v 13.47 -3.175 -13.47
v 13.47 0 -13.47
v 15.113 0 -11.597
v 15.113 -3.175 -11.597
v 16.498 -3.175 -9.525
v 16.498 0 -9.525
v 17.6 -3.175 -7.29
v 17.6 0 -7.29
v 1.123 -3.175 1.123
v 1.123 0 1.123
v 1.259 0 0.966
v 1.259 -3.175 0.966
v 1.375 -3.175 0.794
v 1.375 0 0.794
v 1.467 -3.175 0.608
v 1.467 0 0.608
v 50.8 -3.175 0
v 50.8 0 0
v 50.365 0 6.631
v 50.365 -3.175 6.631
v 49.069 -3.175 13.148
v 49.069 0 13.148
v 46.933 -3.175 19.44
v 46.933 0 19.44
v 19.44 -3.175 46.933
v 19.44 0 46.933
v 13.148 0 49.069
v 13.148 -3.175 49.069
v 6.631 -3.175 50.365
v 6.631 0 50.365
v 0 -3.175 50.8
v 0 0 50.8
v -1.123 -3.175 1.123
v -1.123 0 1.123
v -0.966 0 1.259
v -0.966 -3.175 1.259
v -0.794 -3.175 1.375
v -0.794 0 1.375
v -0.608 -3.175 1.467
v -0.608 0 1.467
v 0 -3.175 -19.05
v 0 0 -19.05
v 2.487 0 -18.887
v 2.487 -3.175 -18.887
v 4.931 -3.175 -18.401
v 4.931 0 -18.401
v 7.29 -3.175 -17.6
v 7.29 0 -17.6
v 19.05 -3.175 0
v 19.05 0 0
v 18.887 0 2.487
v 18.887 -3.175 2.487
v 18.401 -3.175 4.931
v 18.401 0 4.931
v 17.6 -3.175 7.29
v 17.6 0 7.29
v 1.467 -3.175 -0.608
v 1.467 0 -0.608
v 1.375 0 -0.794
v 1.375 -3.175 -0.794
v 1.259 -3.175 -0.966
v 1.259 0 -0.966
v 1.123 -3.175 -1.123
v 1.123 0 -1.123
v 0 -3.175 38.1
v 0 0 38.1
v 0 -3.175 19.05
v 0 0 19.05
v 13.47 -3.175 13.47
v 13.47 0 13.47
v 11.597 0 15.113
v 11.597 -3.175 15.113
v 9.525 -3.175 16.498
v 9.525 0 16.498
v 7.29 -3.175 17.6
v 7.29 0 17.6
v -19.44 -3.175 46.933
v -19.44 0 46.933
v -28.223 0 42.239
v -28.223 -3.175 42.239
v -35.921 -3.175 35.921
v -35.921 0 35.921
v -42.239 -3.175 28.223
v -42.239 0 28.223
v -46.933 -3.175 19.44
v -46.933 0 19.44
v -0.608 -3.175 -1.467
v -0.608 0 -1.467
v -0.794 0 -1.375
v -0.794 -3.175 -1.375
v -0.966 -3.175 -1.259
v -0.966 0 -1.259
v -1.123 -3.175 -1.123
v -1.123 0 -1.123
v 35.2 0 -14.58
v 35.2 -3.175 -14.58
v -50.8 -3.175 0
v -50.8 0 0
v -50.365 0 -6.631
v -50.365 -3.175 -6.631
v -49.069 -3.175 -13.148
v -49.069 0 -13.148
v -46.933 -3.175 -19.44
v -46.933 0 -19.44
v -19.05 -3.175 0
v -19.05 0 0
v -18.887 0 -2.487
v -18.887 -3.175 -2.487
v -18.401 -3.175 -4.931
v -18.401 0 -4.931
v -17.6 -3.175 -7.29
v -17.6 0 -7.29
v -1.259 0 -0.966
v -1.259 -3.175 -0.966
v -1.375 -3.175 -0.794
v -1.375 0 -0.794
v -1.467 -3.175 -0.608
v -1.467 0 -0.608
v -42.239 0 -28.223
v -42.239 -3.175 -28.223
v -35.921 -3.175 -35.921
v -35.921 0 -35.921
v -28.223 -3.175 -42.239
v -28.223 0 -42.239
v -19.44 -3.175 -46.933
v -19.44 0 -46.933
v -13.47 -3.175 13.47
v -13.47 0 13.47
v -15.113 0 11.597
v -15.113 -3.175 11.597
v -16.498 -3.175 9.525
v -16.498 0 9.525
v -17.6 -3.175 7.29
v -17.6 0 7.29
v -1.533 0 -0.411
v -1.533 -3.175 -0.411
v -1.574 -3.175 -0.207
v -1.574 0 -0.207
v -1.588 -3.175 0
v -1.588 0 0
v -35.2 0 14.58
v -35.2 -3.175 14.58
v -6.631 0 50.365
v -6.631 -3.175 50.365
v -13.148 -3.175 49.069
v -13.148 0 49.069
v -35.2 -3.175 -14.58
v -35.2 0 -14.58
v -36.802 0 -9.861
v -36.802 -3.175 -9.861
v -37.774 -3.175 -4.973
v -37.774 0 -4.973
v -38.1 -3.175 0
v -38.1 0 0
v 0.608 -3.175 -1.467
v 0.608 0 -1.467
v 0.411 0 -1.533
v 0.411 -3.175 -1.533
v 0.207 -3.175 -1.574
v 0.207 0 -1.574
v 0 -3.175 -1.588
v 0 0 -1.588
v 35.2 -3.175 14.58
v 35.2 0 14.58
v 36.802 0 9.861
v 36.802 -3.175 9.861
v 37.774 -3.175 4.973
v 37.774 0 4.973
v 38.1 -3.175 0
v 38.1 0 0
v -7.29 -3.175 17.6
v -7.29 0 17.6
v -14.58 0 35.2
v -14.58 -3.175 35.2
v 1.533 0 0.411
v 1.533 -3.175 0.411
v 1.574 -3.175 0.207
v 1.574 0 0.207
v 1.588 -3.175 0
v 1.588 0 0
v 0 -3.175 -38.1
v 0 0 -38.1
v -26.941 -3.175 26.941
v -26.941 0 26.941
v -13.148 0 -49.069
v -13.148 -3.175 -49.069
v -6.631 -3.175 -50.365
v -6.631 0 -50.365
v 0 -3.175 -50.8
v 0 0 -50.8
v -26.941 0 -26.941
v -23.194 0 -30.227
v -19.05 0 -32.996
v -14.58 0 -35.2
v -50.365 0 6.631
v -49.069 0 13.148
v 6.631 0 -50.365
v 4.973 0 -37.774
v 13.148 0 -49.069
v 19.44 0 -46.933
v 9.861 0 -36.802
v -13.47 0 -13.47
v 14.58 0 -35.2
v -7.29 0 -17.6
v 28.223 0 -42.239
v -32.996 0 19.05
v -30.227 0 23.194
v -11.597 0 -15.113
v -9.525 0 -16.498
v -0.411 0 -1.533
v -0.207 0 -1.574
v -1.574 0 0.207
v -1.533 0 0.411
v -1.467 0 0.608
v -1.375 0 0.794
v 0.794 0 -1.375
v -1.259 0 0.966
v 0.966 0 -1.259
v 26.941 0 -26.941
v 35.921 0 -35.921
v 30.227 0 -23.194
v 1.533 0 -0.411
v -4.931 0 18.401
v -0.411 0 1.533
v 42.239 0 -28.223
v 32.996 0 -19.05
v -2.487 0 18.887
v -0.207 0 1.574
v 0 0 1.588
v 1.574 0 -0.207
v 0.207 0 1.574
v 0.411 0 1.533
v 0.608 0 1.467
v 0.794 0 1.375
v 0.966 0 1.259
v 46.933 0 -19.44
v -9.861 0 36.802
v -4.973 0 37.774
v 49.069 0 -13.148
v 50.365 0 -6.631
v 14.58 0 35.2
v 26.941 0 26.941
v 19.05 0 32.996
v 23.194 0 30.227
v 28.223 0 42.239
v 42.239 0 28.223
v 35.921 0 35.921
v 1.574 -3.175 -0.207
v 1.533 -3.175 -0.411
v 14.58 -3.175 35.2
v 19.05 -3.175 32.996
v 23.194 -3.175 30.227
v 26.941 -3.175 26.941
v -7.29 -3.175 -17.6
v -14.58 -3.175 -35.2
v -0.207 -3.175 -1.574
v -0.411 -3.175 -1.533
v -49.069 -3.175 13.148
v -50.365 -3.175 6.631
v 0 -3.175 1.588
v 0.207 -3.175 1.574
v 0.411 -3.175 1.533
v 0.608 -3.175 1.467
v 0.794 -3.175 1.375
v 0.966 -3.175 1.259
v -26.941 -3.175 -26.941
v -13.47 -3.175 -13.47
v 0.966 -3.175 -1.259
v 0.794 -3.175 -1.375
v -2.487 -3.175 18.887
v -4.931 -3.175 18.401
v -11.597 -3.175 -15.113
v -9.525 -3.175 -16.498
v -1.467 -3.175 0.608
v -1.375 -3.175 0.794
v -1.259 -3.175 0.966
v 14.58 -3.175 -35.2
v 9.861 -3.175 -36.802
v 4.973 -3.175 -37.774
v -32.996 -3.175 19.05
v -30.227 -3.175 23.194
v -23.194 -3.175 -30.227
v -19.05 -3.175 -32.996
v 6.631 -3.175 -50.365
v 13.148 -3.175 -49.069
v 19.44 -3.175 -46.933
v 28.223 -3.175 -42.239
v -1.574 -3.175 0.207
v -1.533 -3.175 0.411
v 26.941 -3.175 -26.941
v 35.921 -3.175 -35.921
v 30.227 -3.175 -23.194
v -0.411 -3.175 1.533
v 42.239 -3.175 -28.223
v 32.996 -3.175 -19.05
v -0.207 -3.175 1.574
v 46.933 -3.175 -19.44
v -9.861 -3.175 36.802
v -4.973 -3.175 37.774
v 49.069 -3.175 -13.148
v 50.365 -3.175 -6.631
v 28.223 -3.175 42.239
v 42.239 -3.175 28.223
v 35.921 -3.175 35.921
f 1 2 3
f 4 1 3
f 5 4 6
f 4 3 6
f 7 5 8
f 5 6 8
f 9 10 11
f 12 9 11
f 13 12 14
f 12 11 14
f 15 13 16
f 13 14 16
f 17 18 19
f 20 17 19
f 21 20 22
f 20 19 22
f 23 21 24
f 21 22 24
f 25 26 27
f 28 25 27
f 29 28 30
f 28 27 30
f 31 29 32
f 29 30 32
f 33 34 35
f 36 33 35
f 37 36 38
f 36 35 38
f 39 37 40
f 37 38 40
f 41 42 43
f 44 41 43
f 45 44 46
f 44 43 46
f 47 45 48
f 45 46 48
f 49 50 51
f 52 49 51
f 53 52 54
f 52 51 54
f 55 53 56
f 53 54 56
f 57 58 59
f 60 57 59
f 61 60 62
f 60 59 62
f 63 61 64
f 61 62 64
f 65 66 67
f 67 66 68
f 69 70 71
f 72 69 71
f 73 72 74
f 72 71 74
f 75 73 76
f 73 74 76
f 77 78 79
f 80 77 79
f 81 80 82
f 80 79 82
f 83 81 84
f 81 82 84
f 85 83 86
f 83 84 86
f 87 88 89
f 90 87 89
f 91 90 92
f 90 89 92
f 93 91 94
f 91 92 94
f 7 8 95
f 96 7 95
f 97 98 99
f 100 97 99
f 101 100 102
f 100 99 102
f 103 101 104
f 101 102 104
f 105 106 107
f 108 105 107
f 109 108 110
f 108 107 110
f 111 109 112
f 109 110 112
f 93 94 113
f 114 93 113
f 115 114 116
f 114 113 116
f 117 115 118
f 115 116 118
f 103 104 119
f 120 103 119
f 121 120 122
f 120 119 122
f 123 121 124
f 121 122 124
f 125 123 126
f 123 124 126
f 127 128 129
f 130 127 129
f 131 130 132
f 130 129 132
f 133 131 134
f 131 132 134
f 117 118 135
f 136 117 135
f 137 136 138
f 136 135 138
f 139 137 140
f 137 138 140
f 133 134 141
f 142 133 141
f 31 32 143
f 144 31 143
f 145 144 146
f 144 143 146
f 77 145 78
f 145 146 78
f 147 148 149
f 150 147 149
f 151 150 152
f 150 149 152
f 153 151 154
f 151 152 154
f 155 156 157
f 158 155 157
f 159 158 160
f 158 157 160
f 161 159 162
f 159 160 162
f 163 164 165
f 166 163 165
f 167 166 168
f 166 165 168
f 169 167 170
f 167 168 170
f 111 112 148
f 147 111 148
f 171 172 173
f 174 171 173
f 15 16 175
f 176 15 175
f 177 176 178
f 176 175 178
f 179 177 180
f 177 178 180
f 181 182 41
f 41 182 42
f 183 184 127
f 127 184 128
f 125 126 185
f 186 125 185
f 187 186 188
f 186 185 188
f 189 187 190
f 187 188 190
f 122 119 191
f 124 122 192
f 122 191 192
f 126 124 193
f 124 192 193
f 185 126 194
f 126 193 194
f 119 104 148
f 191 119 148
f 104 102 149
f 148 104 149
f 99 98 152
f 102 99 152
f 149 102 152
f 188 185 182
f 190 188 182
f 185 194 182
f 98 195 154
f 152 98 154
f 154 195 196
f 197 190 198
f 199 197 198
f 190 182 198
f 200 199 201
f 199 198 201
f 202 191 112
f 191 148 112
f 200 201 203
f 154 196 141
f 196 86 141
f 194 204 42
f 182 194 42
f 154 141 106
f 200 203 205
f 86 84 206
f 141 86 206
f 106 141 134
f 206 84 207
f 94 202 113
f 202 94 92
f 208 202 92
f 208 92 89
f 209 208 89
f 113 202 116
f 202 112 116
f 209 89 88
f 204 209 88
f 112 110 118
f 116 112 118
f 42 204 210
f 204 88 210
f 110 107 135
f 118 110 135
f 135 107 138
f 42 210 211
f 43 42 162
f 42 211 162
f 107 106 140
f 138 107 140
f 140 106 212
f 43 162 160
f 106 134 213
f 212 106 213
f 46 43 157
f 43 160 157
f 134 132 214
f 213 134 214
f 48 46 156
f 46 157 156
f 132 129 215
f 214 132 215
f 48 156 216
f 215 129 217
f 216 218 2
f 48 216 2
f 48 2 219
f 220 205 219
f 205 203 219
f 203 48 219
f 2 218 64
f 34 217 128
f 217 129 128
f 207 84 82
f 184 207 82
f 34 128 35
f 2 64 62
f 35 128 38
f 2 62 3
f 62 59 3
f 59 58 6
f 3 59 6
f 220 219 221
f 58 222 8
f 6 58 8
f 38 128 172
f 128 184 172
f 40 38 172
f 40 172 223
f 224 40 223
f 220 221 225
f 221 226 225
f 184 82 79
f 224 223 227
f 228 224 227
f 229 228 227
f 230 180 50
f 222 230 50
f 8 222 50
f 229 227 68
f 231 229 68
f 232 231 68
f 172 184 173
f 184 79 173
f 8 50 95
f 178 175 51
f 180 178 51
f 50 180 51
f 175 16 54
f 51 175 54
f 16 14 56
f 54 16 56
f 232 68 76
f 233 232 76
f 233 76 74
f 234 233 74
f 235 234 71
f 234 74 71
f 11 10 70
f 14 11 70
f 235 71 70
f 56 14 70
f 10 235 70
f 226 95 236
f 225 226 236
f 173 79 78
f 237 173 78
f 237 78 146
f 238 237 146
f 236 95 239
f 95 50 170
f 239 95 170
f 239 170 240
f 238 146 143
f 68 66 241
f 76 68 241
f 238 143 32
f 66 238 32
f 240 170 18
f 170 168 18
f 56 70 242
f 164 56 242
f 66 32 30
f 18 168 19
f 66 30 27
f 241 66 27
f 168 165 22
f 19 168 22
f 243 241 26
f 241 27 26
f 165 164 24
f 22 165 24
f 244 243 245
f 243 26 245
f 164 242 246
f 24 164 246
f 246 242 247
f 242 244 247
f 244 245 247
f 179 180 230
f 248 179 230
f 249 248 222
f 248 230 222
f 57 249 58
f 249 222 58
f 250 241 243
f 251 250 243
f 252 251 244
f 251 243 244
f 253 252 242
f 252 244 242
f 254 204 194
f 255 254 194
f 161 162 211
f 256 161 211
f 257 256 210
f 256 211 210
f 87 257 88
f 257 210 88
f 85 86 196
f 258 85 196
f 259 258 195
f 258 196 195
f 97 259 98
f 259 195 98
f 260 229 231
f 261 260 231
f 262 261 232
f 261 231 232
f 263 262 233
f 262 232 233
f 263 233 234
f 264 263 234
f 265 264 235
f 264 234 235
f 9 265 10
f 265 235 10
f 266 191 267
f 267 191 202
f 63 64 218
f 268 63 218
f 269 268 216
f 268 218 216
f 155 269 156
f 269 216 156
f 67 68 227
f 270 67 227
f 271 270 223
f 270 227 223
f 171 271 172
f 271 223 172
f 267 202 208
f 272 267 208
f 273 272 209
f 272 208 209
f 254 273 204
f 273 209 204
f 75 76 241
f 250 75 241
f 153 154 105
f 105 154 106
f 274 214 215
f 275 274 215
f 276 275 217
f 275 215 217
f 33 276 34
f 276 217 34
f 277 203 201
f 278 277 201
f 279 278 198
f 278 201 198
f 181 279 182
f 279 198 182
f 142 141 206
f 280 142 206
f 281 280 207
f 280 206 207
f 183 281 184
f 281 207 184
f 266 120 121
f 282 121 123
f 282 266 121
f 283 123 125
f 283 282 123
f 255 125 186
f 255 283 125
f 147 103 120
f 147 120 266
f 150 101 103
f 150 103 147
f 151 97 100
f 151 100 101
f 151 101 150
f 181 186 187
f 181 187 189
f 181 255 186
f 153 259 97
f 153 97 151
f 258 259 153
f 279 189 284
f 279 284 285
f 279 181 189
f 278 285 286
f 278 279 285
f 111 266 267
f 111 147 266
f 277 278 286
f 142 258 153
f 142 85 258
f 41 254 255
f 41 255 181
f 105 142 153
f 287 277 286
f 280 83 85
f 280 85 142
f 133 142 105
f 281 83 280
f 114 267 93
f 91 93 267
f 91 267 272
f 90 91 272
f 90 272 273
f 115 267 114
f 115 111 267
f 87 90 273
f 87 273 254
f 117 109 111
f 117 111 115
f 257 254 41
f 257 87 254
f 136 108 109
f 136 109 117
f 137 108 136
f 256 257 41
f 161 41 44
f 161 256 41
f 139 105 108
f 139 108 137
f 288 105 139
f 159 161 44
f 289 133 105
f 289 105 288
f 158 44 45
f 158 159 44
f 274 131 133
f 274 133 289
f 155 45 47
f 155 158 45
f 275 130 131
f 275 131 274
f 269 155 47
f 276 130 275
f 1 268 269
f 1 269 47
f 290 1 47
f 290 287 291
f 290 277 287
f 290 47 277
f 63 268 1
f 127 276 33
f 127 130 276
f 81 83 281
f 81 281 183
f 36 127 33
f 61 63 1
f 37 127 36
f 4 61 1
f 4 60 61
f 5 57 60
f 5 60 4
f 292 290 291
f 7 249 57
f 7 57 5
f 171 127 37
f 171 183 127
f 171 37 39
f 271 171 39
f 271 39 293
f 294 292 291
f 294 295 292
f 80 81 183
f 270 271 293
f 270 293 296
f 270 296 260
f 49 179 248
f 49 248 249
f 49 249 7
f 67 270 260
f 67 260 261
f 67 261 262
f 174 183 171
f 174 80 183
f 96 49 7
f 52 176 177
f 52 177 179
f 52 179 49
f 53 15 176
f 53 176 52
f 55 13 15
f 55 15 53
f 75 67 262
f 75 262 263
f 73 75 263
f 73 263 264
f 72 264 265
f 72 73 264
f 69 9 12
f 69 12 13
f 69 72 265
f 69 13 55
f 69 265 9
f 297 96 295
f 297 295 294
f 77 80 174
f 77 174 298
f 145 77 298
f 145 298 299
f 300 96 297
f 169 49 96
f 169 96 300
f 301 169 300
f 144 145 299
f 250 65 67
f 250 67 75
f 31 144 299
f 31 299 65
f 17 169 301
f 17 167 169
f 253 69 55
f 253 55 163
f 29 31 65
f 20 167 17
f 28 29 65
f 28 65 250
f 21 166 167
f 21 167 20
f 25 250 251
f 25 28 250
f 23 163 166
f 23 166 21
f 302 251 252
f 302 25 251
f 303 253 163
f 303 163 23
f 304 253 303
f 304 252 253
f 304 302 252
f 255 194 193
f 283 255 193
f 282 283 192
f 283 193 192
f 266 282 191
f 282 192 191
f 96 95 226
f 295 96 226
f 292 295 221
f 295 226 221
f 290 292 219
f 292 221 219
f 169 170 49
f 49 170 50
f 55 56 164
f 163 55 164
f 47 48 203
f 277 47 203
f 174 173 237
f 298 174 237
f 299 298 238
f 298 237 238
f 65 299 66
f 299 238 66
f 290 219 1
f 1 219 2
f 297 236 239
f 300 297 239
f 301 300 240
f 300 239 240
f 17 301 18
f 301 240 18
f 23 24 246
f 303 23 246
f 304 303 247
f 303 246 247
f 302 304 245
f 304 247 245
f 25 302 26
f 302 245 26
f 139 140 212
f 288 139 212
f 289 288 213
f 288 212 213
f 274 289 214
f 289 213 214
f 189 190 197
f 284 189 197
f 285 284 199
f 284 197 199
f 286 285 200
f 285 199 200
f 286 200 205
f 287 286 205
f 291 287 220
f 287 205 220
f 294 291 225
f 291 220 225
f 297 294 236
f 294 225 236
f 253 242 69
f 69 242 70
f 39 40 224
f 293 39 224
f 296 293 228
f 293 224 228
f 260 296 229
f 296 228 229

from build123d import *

# Parameters (mm, degrees)
F1_DEPTH = 3.175


with BuildPart() as f1:
    # F0 (on Front) → F1 (new body)
    with BuildSketch(Plane.XZ):
        with BuildLine():
            Line((26.9407683632, 26.9407683632), (35.9210244843, 35.9210244843))
            ThreePointArc((35.9210244843, 35.9210244843), (28.2229678374, 42.238656305), (19.4403183641, 46.9330802516))
            Line((19.4403183641, 46.9330802516), (14.5802387731, 35.1998101887))
            ThreePointArc((14.5802387731, 35.1998101887), (21.167225878, 31.6789922287), (26.9407683632, 26.9407683632))
        make_face()
        with BuildLine():
            Line((0, 38.1), (0, 50.8))
            ThreePointArc((0, 50.8), (-9.9105883584, 49.8238922445), (-19.4403183641, 46.9330802516))
            Line((-19.4403183641, 46.9330802516), (-14.5802387731, 35.1998101887))
            ThreePointArc((-14.5802387731, 35.1998101887), (-7.4329412688, 37.3679191834), (0, 38.1))
        make_face()
        with BuildLine():
            Line((-26.9407683632, 26.9407683632), (-35.9210244843, 35.9210244843))
            ThreePointArc((-35.9210244843, 35.9210244843), (-42.238656305, 28.2229678374), (-46.9330802516, 19.4403183641))
            Line((-46.9330802516, 19.4403183641), (-35.1998101887, 14.5802387731))
            ThreePointArc((-35.1998101887, 14.5802387731), (-31.6789922287, 21.167225878), (-26.9407683632, 26.9407683632))
        make_face()
        with BuildLine():
            Line((38.1, 0), (50.8, 0))
            ThreePointArc((50.8, 0), (49.8238922445, 9.9105883584), (46.9330802516, 19.4403183641))
            Line((46.9330802516, 19.4403183641), (35.1998101887, 14.5802387731))
            ThreePointArc((35.1998101887, 14.5802387731), (37.3679191834, 7.4329412688), (38.1, 0))
        make_face()
        with BuildLine():
            ThreePointArc((-35.9210244843, -35.9210244843), (-28.2229678374, -42.238656305), (-19.4403183641, -46.9330802516))
            Line((-19.4403183641, -46.9330802516), (-14.5802387731, -35.1998101887))
            ThreePointArc((-14.5802387731, -35.1998101887), (-21.167225878, -31.6789922287), (-26.9407683632, -26.9407683632))
            Line((-26.9407683632, -26.9407683632), (-35.9210244843, -35.9210244843))
        make_face()
        with BuildLine():
            ThreePointArc((0, -50.8), (9.9105883584, -49.8238922445), (19.4403183641, -46.9330802516))
            Line((19.4403183641, -46.9330802516), (14.5802387731, -35.1998101887))
            ThreePointArc((14.5802387731, -35.1998101887), (7.4329412688, -37.3679191834), (0, -38.1))
            Line((0, -38.1), (0, -50.8))
        make_face()
        with BuildLine():
            ThreePointArc((35.9210244843, -35.9210244843), (42.238656305, -28.2229678374), (46.9330802516, -19.4403183641))
            Line((46.9330802516, -19.4403183641), (35.1998101887, -14.5802387731))
            ThreePointArc((35.1998101887, -14.5802387731), (31.6789922287, -21.167225878), (26.9407683632, -26.9407683632))
            Line((26.9407683632, -26.9407683632), (35.9210244843, -35.9210244843))
        make_face()
        with BuildLine():
            Line((-13.4703841816, 13.4703841816), (-1.1225320151, 1.1225320151))
            ThreePointArc((-1.1225320151, 1.1225320151), (-0.8819677449, 1.3199580095), (-0.6075099489, 1.4666587579))
            Line((-0.6075099489, 1.4666587579), (-7.2901193866, 17.5999050943))
            ThreePointArc((-7.2901193866, 17.5999050943), (-10.583612939, 15.8394961144), (-13.4703841816, 13.4703841816))
        make_face()
        with BuildLine():
            Line((0.6075099489, 1.4666587579), (7.2901193866, 17.5999050943))
            ThreePointArc((7.2901193866, 17.5999050943), (3.7164706344, 18.6839595917), (0, 19.05))
            Line((0, 19.05), (0, 1.5875))
            ThreePointArc((0, 1.5875), (0.3097058862, 1.5569966326), (0.6075099489, 1.4666587579))
        make_face()
        with BuildLine():
            Line((1.1225320151, 1.1225320151), (13.4703841816, 13.4703841816))
            ThreePointArc((13.4703841816, 13.4703841816), (10.583612939, 15.8394961144), (7.2901193866, 17.5999050943))
            Line((7.2901193866, 17.5999050943), (0.6075099489, 1.4666587579))
            ThreePointArc((0.6075099489, 1.4666587579), (0.8819677449, 1.3199580095), (1.1225320151, 1.1225320151))
        make_face()
        with BuildLine():
            Line((1.4666587579, 0.6075099489), (17.5999050943, 7.2901193866))
            ThreePointArc((17.5999050943, 7.2901193866), (15.8394961144, 10.583612939), (13.4703841816, 13.4703841816))
            Line((13.4703841816, 13.4703841816), (1.1225320151, 1.1225320151))
            ThreePointArc((1.1225320151, 1.1225320151), (1.3199580095, 0.8819677449), (1.4666587579, 0.6075099489))
        make_face()
        with BuildLine():
            Line((1.5875, 0), (19.05, 0))
            ThreePointArc((19.05, 0), (18.6839595917, 3.7164706344), (17.5999050943, 7.2901193866))
            Line((17.5999050943, 7.2901193866), (1.4666587579, 0.6075099489))
            ThreePointArc((1.4666587579, 0.6075099489), (1.5569966326, 0.3097058862), (1.5875, 0))
        make_face()
        with BuildLine():
            ThreePointArc((17.5999050943, -7.2901193866), (18.6839595917, -3.7164706344), (19.05, 0))
            Line((19.05, 0), (1.5875, 0))
            ThreePointArc((1.5875, 0), (1.5569966326, -0.3097058862), (1.4666587579, -0.6075099489))
            Line((1.4666587579, -0.6075099489), (17.5999050943, -7.2901193866))
        make_face()
        with BuildLine():
            ThreePointArc((7.2901193866, -17.5999050943), (10.583612939, -15.8394961144), (13.4703841816, -13.4703841816))
            Line((13.4703841816, -13.4703841816), (1.1225320151, -1.1225320151))
            ThreePointArc((1.1225320151, -1.1225320151), (0.8819677449, -1.3199580095), (0.6075099489, -1.4666587579))
            Line((0.6075099489, -1.4666587579), (7.2901193866, -17.5999050943))
        make_face()
        with BuildLine():
            Line((-13.4703841816, -13.4703841816), (-1.1225320151, -1.1225320151))
            ThreePointArc((-1.1225320151, -1.1225320151), (-1.3199580095, -0.8819677449), (-1.4666587579, -0.6075099489))
            Line((-1.4666587579, -0.6075099489), (-17.5999050943, -7.2901193866))
            ThreePointArc((-17.5999050943, -7.2901193866), (-15.8394961144, -10.583612939), (-13.4703841816, -13.4703841816))
        make_face()
        with BuildLine():
            Line((-19.05, 0), (-1.5875, 0))
            ThreePointArc((-1.5875, 0), (-1.5569966326, 0.3097058862), (-1.4666587579, 0.6075099489))
            Line((-1.4666587579, 0.6075099489), (-17.5999050943, 7.2901193866))
            ThreePointArc((-17.5999050943, 7.2901193866), (-18.6839595917, 3.7164706344), (-19.05, 0))
        make_face()
        with BuildLine():
            ThreePointArc((-1.4666587579, 0.6075099489), (-1.3199580095, 0.8819677449), (-1.1225320151, 1.1225320151))
            Line((-1.1225320151, 1.1225320151), (-13.4703841816, 13.4703841816))
            ThreePointArc((-13.4703841816, 13.4703841816), (-15.8394961144, 10.583612939), (-17.5999050943, 7.2901193866))
            Line((-17.5999050943, 7.2901193866), (-1.4666587579, 0.6075099489))
        make_face()
        with BuildLine():
            ThreePointArc((-1.4666587579, -0.6075099489), (-1.5569966326, -0.3097058862), (-1.5875, 0))
            Line((-1.5875, 0), (-19.05, 0))
            ThreePointArc((-19.05, 0), (-18.6839595917, -3.7164706344), (-17.5999050943, -7.2901193866))
            Line((-17.5999050943, -7.2901193866), (-1.4666587579, -0.6075099489))
        make_face()
        with BuildLine():
            ThreePointArc((-0.6075099489, -1.4666587579), (-0.8819677449, -1.3199580095), (-1.1225320151, -1.1225320151))
            Line((-1.1225320151, -1.1225320151), (-13.4703841816, -13.4703841816))
            ThreePointArc((-13.4703841816, -13.4703841816), (-10.583612939, -15.8394961144), (-7.2901193866, -17.5999050943))
            Line((-7.2901193866, -17.5999050943), (-0.6075099489, -1.4666587579))
        make_face()
        with BuildLine():
            Line((0, -19.05), (0, -1.5875))
            ThreePointArc((0, -1.5875), (-0.3097058862, -1.5569966326), (-0.6075099489, -1.4666587579))
            Line((-0.6075099489, -1.4666587579), (-7.2901193866, -17.5999050943))
            ThreePointArc((-7.2901193866, -17.5999050943), (-3.7164706344, -18.6839595917), (0, -19.05))
        make_face()
        with BuildLine():
            ThreePointArc((0, -19.05), (3.7164706344, -18.6839595917), (7.2901193866, -17.5999050943))
            Line((7.2901193866, -17.5999050943), (0.6075099489, -1.4666587579))
            ThreePointArc((0.6075099489, -1.4666587579), (0.3097058862, -1.5569966326), (0, -1.5875))
            Line((0, -1.5875), (0, -19.05))
        make_face()
        with BuildLine():
            ThreePointArc((13.4703841816, -13.4703841816), (15.8394961144, -10.583612939), (17.5999050943, -7.2901193866))
            Line((17.5999050943, -7.2901193866), (1.4666587579, -0.6075099489))
            ThreePointArc((1.4666587579, -0.6075099489), (1.3199580095, -0.8819677449), (1.1225320151, -1.1225320151))
            Line((1.1225320151, -1.1225320151), (13.4703841816, -13.4703841816))
        make_face()
        with BuildLine():
            ThreePointArc((-0.6075099489, 1.4666587579), (-0.3097058862, 1.5569966326), (0, 1.5875))
            Line((0, 1.5875), (0, 19.05))
            ThreePointArc((0, 19.05), (-3.7164706344, 18.6839595917), (-7.2901193866, 17.5999050943))
            Line((-7.2901193866, 17.5999050943), (-0.6075099489, 1.4666587579))
        make_face()
        with BuildLine():
            ThreePointArc((-50.8, 0), (-49.8238922445, -9.9105883584), (-46.9330802516, -19.4403183641))
            Line((-46.9330802516, -19.4403183641), (-35.1998101887, -14.5802387731))
            ThreePointArc((-35.1998101887, -14.5802387731), (-37.3679191834, -7.4329412688), (-38.1, 0))
            Line((-38.1, 0), (-50.8, 0))
        make_face()
        with BuildLine():
            Line((-14.5802387731, 35.1998101887), (-19.4403183641, 46.9330802516))
            ThreePointArc((-19.4403183641, 46.9330802516), (-28.2229678374, 42.238656305), (-35.9210244843, 35.9210244843))
            Line((-35.9210244843, 35.9210244843), (-26.9407683632, 26.9407683632))
            ThreePointArc((-26.9407683632, 26.9407683632), (-21.167225878, 31.6789922287), (-14.5802387731, 35.1998101887))
        make_face()
        with BuildLine():
            Line((14.5802387731, 35.1998101887), (19.4403183641, 46.9330802516))
            ThreePointArc((19.4403183641, 46.9330802516), (9.9105883584, 49.8238922445), (0, 50.8))
            Line((0, 50.8), (0, 38.1))
            ThreePointArc((0, 38.1), (7.4329412688, 37.3679191834), (14.5802387731, 35.1998101887))
        make_face()
        with BuildLine():
            Line((35.1998101887, 14.5802387731), (46.9330802516, 19.4403183641))
            ThreePointArc((46.9330802516, 19.4403183641), (42.238656305, 28.2229678374), (35.9210244843, 35.9210244843))
            Line((35.9210244843, 35.9210244843), (26.9407683632, 26.9407683632))
            ThreePointArc((26.9407683632, 26.9407683632), (31.6789922287, 21.167225878), (35.1998101887, 14.5802387731))
        make_face()
        with BuildLine():
            ThreePointArc((19.4403183641, -46.9330802516), (28.2229678374, -42.238656305), (35.9210244843, -35.9210244843))
            Line((35.9210244843, -35.9210244843), (26.9407683632, -26.9407683632))
            ThreePointArc((26.9407683632, -26.9407683632), (21.167225878, -31.6789922287), (14.5802387731, -35.1998101887))
            Line((14.5802387731, -35.1998101887), (19.4403183641, -46.9330802516))
        make_face()
        with BuildLine():
            ThreePointArc((-19.4403183641, -46.9330802516), (-9.9105883584, -49.8238922445), (0, -50.8))
            Line((0, -50.8), (0, -38.1))
            ThreePointArc((0, -38.1), (-7.4329412688, -37.3679191834), (-14.5802387731, -35.1998101887))
            Line((-14.5802387731, -35.1998101887), (-19.4403183641, -46.9330802516))
        make_face()
        with BuildLine():
            ThreePointArc((-46.9330802516, -19.4403183641), (-42.238656305, -28.2229678374), (-35.9210244843, -35.9210244843))
            Line((-35.9210244843, -35.9210244843), (-26.9407683632, -26.9407683632))
            ThreePointArc((-26.9407683632, -26.9407683632), (-31.6789922287, -21.167225878), (-35.1998101887, -14.5802387731))
            Line((-35.1998101887, -14.5802387731), (-46.9330802516, -19.4403183641))
        make_face()
        with BuildLine():
            ThreePointArc((46.9330802516, -19.4403183641), (49.8238922445, -9.9105883584), (50.8, 0))
            Line((50.8, 0), (38.1, 0))
            ThreePointArc((38.1, 0), (37.3679191834, -7.4329412688), (35.1998101887, -14.5802387731))
            Line((35.1998101887, -14.5802387731), (46.9330802516, -19.4403183641))
        make_face()
        with BuildLine():
            Line((-38.1, 0), (-19.05, 0))
            ThreePointArc((-19.05, 0), (-18.6839595917, 3.7164706344), (-17.5999050943, 7.2901193866))
            Line((-17.5999050943, 7.2901193866), (-35.1998101887, 14.5802387731))
            ThreePointArc((-35.1998101887, 14.5802387731), (-37.3679191834, 7.4329412688), (-38.1, 0))
        make_face()
        with BuildLine():
            Line((-7.2901193866, 17.5999050943), (-14.5802387731, 35.1998101887))
            ThreePointArc((-14.5802387731, 35.1998101887), (-21.167225878, 31.6789922287), (-26.9407683632, 26.9407683632))
            Line((-26.9407683632, 26.9407683632), (-13.4703841816, 13.4703841816))
            ThreePointArc((-13.4703841816, 13.4703841816), (-10.583612939, 15.8394961144), (-7.2901193866, 17.5999050943))
        make_face()
        with BuildLine():
            Line((7.2901193866, 17.5999050943), (14.5802387731, 35.1998101887))
            ThreePointArc((14.5802387731, 35.1998101887), (7.4329412688, 37.3679191834), (0, 38.1))
            Line((0, 38.1), (0, 19.05))
            ThreePointArc((0, 19.05), (3.7164706344, 18.6839595917), (7.2901193866, 17.5999050943))
        make_face()
        with BuildLine():
            Line((17.5999050943, 7.2901193866), (35.1998101887, 14.5802387731))
            ThreePointArc((35.1998101887, 14.5802387731), (31.6789922287, 21.167225878), (26.9407683632, 26.9407683632))
            Line((26.9407683632, 26.9407683632), (13.4703841816, 13.4703841816))
            ThreePointArc((13.4703841816, 13.4703841816), (15.8394961144, 10.583612939), (17.5999050943, 7.2901193866))
        make_face()
        with BuildLine():
            ThreePointArc((35.1998101887, -14.5802387731), (37.3679191834, -7.4329412688), (38.1, 0))
            Line((38.1, 0), (19.05, 0))
            ThreePointArc((19.05, 0), (18.6839595917, -3.7164706344), (17.5999050943, -7.2901193866))
            Line((17.5999050943, -7.2901193866), (35.1998101887, -14.5802387731))
        make_face()
        with BuildLine():
            ThreePointArc((-14.5802387731, -35.1998101887), (-7.4329412688, -37.3679191834), (0, -38.1))
            Line((0, -38.1), (0, -19.05))
            ThreePointArc((0, -19.05), (-3.7164706344, -18.6839595917), (-7.2901193866, -17.5999050943))
            Line((-7.2901193866, -17.5999050943), (-14.5802387731, -35.1998101887))
        make_face()
        with BuildLine():
            Line((-26.9407683632, -26.9407683632), (-13.4703841816, -13.4703841816))
            ThreePointArc((-13.4703841816, -13.4703841816), (-15.8394961144, -10.583612939), (-17.5999050943, -7.2901193866))
            Line((-17.5999050943, -7.2901193866), (-35.1998101887, -14.5802387731))
            ThreePointArc((-35.1998101887, -14.5802387731), (-31.6789922287, -21.167225878), (-26.9407683632, -26.9407683632))
        make_face()
        with BuildLine():
            Line((-35.1998101887, 14.5802387731), (-46.9330802516, 19.4403183641))
            ThreePointArc((-46.9330802516, 19.4403183641), (-49.8238922445, 9.9105883584), (-50.8, 0))
            Line((-50.8, 0), (-38.1, 0))
            ThreePointArc((-38.1, 0), (-37.3679191834, 7.4329412688), (-35.1998101887, 14.5802387731))
        make_face()
        with BuildLine():
            ThreePointArc((14.5802387731, -35.1998101887), (21.167225878, -31.6789922287), (26.9407683632, -26.9407683632))
            Line((26.9407683632, -26.9407683632), (13.4703841816, -13.4703841816))
            ThreePointArc((13.4703841816, -13.4703841816), (10.583612939, -15.8394961144), (7.2901193866, -17.5999050943))
            Line((7.2901193866, -17.5999050943), (14.5802387731, -35.1998101887))
        make_face()
    extrude(amount=F1_DEPTH)


solid = f1.part
